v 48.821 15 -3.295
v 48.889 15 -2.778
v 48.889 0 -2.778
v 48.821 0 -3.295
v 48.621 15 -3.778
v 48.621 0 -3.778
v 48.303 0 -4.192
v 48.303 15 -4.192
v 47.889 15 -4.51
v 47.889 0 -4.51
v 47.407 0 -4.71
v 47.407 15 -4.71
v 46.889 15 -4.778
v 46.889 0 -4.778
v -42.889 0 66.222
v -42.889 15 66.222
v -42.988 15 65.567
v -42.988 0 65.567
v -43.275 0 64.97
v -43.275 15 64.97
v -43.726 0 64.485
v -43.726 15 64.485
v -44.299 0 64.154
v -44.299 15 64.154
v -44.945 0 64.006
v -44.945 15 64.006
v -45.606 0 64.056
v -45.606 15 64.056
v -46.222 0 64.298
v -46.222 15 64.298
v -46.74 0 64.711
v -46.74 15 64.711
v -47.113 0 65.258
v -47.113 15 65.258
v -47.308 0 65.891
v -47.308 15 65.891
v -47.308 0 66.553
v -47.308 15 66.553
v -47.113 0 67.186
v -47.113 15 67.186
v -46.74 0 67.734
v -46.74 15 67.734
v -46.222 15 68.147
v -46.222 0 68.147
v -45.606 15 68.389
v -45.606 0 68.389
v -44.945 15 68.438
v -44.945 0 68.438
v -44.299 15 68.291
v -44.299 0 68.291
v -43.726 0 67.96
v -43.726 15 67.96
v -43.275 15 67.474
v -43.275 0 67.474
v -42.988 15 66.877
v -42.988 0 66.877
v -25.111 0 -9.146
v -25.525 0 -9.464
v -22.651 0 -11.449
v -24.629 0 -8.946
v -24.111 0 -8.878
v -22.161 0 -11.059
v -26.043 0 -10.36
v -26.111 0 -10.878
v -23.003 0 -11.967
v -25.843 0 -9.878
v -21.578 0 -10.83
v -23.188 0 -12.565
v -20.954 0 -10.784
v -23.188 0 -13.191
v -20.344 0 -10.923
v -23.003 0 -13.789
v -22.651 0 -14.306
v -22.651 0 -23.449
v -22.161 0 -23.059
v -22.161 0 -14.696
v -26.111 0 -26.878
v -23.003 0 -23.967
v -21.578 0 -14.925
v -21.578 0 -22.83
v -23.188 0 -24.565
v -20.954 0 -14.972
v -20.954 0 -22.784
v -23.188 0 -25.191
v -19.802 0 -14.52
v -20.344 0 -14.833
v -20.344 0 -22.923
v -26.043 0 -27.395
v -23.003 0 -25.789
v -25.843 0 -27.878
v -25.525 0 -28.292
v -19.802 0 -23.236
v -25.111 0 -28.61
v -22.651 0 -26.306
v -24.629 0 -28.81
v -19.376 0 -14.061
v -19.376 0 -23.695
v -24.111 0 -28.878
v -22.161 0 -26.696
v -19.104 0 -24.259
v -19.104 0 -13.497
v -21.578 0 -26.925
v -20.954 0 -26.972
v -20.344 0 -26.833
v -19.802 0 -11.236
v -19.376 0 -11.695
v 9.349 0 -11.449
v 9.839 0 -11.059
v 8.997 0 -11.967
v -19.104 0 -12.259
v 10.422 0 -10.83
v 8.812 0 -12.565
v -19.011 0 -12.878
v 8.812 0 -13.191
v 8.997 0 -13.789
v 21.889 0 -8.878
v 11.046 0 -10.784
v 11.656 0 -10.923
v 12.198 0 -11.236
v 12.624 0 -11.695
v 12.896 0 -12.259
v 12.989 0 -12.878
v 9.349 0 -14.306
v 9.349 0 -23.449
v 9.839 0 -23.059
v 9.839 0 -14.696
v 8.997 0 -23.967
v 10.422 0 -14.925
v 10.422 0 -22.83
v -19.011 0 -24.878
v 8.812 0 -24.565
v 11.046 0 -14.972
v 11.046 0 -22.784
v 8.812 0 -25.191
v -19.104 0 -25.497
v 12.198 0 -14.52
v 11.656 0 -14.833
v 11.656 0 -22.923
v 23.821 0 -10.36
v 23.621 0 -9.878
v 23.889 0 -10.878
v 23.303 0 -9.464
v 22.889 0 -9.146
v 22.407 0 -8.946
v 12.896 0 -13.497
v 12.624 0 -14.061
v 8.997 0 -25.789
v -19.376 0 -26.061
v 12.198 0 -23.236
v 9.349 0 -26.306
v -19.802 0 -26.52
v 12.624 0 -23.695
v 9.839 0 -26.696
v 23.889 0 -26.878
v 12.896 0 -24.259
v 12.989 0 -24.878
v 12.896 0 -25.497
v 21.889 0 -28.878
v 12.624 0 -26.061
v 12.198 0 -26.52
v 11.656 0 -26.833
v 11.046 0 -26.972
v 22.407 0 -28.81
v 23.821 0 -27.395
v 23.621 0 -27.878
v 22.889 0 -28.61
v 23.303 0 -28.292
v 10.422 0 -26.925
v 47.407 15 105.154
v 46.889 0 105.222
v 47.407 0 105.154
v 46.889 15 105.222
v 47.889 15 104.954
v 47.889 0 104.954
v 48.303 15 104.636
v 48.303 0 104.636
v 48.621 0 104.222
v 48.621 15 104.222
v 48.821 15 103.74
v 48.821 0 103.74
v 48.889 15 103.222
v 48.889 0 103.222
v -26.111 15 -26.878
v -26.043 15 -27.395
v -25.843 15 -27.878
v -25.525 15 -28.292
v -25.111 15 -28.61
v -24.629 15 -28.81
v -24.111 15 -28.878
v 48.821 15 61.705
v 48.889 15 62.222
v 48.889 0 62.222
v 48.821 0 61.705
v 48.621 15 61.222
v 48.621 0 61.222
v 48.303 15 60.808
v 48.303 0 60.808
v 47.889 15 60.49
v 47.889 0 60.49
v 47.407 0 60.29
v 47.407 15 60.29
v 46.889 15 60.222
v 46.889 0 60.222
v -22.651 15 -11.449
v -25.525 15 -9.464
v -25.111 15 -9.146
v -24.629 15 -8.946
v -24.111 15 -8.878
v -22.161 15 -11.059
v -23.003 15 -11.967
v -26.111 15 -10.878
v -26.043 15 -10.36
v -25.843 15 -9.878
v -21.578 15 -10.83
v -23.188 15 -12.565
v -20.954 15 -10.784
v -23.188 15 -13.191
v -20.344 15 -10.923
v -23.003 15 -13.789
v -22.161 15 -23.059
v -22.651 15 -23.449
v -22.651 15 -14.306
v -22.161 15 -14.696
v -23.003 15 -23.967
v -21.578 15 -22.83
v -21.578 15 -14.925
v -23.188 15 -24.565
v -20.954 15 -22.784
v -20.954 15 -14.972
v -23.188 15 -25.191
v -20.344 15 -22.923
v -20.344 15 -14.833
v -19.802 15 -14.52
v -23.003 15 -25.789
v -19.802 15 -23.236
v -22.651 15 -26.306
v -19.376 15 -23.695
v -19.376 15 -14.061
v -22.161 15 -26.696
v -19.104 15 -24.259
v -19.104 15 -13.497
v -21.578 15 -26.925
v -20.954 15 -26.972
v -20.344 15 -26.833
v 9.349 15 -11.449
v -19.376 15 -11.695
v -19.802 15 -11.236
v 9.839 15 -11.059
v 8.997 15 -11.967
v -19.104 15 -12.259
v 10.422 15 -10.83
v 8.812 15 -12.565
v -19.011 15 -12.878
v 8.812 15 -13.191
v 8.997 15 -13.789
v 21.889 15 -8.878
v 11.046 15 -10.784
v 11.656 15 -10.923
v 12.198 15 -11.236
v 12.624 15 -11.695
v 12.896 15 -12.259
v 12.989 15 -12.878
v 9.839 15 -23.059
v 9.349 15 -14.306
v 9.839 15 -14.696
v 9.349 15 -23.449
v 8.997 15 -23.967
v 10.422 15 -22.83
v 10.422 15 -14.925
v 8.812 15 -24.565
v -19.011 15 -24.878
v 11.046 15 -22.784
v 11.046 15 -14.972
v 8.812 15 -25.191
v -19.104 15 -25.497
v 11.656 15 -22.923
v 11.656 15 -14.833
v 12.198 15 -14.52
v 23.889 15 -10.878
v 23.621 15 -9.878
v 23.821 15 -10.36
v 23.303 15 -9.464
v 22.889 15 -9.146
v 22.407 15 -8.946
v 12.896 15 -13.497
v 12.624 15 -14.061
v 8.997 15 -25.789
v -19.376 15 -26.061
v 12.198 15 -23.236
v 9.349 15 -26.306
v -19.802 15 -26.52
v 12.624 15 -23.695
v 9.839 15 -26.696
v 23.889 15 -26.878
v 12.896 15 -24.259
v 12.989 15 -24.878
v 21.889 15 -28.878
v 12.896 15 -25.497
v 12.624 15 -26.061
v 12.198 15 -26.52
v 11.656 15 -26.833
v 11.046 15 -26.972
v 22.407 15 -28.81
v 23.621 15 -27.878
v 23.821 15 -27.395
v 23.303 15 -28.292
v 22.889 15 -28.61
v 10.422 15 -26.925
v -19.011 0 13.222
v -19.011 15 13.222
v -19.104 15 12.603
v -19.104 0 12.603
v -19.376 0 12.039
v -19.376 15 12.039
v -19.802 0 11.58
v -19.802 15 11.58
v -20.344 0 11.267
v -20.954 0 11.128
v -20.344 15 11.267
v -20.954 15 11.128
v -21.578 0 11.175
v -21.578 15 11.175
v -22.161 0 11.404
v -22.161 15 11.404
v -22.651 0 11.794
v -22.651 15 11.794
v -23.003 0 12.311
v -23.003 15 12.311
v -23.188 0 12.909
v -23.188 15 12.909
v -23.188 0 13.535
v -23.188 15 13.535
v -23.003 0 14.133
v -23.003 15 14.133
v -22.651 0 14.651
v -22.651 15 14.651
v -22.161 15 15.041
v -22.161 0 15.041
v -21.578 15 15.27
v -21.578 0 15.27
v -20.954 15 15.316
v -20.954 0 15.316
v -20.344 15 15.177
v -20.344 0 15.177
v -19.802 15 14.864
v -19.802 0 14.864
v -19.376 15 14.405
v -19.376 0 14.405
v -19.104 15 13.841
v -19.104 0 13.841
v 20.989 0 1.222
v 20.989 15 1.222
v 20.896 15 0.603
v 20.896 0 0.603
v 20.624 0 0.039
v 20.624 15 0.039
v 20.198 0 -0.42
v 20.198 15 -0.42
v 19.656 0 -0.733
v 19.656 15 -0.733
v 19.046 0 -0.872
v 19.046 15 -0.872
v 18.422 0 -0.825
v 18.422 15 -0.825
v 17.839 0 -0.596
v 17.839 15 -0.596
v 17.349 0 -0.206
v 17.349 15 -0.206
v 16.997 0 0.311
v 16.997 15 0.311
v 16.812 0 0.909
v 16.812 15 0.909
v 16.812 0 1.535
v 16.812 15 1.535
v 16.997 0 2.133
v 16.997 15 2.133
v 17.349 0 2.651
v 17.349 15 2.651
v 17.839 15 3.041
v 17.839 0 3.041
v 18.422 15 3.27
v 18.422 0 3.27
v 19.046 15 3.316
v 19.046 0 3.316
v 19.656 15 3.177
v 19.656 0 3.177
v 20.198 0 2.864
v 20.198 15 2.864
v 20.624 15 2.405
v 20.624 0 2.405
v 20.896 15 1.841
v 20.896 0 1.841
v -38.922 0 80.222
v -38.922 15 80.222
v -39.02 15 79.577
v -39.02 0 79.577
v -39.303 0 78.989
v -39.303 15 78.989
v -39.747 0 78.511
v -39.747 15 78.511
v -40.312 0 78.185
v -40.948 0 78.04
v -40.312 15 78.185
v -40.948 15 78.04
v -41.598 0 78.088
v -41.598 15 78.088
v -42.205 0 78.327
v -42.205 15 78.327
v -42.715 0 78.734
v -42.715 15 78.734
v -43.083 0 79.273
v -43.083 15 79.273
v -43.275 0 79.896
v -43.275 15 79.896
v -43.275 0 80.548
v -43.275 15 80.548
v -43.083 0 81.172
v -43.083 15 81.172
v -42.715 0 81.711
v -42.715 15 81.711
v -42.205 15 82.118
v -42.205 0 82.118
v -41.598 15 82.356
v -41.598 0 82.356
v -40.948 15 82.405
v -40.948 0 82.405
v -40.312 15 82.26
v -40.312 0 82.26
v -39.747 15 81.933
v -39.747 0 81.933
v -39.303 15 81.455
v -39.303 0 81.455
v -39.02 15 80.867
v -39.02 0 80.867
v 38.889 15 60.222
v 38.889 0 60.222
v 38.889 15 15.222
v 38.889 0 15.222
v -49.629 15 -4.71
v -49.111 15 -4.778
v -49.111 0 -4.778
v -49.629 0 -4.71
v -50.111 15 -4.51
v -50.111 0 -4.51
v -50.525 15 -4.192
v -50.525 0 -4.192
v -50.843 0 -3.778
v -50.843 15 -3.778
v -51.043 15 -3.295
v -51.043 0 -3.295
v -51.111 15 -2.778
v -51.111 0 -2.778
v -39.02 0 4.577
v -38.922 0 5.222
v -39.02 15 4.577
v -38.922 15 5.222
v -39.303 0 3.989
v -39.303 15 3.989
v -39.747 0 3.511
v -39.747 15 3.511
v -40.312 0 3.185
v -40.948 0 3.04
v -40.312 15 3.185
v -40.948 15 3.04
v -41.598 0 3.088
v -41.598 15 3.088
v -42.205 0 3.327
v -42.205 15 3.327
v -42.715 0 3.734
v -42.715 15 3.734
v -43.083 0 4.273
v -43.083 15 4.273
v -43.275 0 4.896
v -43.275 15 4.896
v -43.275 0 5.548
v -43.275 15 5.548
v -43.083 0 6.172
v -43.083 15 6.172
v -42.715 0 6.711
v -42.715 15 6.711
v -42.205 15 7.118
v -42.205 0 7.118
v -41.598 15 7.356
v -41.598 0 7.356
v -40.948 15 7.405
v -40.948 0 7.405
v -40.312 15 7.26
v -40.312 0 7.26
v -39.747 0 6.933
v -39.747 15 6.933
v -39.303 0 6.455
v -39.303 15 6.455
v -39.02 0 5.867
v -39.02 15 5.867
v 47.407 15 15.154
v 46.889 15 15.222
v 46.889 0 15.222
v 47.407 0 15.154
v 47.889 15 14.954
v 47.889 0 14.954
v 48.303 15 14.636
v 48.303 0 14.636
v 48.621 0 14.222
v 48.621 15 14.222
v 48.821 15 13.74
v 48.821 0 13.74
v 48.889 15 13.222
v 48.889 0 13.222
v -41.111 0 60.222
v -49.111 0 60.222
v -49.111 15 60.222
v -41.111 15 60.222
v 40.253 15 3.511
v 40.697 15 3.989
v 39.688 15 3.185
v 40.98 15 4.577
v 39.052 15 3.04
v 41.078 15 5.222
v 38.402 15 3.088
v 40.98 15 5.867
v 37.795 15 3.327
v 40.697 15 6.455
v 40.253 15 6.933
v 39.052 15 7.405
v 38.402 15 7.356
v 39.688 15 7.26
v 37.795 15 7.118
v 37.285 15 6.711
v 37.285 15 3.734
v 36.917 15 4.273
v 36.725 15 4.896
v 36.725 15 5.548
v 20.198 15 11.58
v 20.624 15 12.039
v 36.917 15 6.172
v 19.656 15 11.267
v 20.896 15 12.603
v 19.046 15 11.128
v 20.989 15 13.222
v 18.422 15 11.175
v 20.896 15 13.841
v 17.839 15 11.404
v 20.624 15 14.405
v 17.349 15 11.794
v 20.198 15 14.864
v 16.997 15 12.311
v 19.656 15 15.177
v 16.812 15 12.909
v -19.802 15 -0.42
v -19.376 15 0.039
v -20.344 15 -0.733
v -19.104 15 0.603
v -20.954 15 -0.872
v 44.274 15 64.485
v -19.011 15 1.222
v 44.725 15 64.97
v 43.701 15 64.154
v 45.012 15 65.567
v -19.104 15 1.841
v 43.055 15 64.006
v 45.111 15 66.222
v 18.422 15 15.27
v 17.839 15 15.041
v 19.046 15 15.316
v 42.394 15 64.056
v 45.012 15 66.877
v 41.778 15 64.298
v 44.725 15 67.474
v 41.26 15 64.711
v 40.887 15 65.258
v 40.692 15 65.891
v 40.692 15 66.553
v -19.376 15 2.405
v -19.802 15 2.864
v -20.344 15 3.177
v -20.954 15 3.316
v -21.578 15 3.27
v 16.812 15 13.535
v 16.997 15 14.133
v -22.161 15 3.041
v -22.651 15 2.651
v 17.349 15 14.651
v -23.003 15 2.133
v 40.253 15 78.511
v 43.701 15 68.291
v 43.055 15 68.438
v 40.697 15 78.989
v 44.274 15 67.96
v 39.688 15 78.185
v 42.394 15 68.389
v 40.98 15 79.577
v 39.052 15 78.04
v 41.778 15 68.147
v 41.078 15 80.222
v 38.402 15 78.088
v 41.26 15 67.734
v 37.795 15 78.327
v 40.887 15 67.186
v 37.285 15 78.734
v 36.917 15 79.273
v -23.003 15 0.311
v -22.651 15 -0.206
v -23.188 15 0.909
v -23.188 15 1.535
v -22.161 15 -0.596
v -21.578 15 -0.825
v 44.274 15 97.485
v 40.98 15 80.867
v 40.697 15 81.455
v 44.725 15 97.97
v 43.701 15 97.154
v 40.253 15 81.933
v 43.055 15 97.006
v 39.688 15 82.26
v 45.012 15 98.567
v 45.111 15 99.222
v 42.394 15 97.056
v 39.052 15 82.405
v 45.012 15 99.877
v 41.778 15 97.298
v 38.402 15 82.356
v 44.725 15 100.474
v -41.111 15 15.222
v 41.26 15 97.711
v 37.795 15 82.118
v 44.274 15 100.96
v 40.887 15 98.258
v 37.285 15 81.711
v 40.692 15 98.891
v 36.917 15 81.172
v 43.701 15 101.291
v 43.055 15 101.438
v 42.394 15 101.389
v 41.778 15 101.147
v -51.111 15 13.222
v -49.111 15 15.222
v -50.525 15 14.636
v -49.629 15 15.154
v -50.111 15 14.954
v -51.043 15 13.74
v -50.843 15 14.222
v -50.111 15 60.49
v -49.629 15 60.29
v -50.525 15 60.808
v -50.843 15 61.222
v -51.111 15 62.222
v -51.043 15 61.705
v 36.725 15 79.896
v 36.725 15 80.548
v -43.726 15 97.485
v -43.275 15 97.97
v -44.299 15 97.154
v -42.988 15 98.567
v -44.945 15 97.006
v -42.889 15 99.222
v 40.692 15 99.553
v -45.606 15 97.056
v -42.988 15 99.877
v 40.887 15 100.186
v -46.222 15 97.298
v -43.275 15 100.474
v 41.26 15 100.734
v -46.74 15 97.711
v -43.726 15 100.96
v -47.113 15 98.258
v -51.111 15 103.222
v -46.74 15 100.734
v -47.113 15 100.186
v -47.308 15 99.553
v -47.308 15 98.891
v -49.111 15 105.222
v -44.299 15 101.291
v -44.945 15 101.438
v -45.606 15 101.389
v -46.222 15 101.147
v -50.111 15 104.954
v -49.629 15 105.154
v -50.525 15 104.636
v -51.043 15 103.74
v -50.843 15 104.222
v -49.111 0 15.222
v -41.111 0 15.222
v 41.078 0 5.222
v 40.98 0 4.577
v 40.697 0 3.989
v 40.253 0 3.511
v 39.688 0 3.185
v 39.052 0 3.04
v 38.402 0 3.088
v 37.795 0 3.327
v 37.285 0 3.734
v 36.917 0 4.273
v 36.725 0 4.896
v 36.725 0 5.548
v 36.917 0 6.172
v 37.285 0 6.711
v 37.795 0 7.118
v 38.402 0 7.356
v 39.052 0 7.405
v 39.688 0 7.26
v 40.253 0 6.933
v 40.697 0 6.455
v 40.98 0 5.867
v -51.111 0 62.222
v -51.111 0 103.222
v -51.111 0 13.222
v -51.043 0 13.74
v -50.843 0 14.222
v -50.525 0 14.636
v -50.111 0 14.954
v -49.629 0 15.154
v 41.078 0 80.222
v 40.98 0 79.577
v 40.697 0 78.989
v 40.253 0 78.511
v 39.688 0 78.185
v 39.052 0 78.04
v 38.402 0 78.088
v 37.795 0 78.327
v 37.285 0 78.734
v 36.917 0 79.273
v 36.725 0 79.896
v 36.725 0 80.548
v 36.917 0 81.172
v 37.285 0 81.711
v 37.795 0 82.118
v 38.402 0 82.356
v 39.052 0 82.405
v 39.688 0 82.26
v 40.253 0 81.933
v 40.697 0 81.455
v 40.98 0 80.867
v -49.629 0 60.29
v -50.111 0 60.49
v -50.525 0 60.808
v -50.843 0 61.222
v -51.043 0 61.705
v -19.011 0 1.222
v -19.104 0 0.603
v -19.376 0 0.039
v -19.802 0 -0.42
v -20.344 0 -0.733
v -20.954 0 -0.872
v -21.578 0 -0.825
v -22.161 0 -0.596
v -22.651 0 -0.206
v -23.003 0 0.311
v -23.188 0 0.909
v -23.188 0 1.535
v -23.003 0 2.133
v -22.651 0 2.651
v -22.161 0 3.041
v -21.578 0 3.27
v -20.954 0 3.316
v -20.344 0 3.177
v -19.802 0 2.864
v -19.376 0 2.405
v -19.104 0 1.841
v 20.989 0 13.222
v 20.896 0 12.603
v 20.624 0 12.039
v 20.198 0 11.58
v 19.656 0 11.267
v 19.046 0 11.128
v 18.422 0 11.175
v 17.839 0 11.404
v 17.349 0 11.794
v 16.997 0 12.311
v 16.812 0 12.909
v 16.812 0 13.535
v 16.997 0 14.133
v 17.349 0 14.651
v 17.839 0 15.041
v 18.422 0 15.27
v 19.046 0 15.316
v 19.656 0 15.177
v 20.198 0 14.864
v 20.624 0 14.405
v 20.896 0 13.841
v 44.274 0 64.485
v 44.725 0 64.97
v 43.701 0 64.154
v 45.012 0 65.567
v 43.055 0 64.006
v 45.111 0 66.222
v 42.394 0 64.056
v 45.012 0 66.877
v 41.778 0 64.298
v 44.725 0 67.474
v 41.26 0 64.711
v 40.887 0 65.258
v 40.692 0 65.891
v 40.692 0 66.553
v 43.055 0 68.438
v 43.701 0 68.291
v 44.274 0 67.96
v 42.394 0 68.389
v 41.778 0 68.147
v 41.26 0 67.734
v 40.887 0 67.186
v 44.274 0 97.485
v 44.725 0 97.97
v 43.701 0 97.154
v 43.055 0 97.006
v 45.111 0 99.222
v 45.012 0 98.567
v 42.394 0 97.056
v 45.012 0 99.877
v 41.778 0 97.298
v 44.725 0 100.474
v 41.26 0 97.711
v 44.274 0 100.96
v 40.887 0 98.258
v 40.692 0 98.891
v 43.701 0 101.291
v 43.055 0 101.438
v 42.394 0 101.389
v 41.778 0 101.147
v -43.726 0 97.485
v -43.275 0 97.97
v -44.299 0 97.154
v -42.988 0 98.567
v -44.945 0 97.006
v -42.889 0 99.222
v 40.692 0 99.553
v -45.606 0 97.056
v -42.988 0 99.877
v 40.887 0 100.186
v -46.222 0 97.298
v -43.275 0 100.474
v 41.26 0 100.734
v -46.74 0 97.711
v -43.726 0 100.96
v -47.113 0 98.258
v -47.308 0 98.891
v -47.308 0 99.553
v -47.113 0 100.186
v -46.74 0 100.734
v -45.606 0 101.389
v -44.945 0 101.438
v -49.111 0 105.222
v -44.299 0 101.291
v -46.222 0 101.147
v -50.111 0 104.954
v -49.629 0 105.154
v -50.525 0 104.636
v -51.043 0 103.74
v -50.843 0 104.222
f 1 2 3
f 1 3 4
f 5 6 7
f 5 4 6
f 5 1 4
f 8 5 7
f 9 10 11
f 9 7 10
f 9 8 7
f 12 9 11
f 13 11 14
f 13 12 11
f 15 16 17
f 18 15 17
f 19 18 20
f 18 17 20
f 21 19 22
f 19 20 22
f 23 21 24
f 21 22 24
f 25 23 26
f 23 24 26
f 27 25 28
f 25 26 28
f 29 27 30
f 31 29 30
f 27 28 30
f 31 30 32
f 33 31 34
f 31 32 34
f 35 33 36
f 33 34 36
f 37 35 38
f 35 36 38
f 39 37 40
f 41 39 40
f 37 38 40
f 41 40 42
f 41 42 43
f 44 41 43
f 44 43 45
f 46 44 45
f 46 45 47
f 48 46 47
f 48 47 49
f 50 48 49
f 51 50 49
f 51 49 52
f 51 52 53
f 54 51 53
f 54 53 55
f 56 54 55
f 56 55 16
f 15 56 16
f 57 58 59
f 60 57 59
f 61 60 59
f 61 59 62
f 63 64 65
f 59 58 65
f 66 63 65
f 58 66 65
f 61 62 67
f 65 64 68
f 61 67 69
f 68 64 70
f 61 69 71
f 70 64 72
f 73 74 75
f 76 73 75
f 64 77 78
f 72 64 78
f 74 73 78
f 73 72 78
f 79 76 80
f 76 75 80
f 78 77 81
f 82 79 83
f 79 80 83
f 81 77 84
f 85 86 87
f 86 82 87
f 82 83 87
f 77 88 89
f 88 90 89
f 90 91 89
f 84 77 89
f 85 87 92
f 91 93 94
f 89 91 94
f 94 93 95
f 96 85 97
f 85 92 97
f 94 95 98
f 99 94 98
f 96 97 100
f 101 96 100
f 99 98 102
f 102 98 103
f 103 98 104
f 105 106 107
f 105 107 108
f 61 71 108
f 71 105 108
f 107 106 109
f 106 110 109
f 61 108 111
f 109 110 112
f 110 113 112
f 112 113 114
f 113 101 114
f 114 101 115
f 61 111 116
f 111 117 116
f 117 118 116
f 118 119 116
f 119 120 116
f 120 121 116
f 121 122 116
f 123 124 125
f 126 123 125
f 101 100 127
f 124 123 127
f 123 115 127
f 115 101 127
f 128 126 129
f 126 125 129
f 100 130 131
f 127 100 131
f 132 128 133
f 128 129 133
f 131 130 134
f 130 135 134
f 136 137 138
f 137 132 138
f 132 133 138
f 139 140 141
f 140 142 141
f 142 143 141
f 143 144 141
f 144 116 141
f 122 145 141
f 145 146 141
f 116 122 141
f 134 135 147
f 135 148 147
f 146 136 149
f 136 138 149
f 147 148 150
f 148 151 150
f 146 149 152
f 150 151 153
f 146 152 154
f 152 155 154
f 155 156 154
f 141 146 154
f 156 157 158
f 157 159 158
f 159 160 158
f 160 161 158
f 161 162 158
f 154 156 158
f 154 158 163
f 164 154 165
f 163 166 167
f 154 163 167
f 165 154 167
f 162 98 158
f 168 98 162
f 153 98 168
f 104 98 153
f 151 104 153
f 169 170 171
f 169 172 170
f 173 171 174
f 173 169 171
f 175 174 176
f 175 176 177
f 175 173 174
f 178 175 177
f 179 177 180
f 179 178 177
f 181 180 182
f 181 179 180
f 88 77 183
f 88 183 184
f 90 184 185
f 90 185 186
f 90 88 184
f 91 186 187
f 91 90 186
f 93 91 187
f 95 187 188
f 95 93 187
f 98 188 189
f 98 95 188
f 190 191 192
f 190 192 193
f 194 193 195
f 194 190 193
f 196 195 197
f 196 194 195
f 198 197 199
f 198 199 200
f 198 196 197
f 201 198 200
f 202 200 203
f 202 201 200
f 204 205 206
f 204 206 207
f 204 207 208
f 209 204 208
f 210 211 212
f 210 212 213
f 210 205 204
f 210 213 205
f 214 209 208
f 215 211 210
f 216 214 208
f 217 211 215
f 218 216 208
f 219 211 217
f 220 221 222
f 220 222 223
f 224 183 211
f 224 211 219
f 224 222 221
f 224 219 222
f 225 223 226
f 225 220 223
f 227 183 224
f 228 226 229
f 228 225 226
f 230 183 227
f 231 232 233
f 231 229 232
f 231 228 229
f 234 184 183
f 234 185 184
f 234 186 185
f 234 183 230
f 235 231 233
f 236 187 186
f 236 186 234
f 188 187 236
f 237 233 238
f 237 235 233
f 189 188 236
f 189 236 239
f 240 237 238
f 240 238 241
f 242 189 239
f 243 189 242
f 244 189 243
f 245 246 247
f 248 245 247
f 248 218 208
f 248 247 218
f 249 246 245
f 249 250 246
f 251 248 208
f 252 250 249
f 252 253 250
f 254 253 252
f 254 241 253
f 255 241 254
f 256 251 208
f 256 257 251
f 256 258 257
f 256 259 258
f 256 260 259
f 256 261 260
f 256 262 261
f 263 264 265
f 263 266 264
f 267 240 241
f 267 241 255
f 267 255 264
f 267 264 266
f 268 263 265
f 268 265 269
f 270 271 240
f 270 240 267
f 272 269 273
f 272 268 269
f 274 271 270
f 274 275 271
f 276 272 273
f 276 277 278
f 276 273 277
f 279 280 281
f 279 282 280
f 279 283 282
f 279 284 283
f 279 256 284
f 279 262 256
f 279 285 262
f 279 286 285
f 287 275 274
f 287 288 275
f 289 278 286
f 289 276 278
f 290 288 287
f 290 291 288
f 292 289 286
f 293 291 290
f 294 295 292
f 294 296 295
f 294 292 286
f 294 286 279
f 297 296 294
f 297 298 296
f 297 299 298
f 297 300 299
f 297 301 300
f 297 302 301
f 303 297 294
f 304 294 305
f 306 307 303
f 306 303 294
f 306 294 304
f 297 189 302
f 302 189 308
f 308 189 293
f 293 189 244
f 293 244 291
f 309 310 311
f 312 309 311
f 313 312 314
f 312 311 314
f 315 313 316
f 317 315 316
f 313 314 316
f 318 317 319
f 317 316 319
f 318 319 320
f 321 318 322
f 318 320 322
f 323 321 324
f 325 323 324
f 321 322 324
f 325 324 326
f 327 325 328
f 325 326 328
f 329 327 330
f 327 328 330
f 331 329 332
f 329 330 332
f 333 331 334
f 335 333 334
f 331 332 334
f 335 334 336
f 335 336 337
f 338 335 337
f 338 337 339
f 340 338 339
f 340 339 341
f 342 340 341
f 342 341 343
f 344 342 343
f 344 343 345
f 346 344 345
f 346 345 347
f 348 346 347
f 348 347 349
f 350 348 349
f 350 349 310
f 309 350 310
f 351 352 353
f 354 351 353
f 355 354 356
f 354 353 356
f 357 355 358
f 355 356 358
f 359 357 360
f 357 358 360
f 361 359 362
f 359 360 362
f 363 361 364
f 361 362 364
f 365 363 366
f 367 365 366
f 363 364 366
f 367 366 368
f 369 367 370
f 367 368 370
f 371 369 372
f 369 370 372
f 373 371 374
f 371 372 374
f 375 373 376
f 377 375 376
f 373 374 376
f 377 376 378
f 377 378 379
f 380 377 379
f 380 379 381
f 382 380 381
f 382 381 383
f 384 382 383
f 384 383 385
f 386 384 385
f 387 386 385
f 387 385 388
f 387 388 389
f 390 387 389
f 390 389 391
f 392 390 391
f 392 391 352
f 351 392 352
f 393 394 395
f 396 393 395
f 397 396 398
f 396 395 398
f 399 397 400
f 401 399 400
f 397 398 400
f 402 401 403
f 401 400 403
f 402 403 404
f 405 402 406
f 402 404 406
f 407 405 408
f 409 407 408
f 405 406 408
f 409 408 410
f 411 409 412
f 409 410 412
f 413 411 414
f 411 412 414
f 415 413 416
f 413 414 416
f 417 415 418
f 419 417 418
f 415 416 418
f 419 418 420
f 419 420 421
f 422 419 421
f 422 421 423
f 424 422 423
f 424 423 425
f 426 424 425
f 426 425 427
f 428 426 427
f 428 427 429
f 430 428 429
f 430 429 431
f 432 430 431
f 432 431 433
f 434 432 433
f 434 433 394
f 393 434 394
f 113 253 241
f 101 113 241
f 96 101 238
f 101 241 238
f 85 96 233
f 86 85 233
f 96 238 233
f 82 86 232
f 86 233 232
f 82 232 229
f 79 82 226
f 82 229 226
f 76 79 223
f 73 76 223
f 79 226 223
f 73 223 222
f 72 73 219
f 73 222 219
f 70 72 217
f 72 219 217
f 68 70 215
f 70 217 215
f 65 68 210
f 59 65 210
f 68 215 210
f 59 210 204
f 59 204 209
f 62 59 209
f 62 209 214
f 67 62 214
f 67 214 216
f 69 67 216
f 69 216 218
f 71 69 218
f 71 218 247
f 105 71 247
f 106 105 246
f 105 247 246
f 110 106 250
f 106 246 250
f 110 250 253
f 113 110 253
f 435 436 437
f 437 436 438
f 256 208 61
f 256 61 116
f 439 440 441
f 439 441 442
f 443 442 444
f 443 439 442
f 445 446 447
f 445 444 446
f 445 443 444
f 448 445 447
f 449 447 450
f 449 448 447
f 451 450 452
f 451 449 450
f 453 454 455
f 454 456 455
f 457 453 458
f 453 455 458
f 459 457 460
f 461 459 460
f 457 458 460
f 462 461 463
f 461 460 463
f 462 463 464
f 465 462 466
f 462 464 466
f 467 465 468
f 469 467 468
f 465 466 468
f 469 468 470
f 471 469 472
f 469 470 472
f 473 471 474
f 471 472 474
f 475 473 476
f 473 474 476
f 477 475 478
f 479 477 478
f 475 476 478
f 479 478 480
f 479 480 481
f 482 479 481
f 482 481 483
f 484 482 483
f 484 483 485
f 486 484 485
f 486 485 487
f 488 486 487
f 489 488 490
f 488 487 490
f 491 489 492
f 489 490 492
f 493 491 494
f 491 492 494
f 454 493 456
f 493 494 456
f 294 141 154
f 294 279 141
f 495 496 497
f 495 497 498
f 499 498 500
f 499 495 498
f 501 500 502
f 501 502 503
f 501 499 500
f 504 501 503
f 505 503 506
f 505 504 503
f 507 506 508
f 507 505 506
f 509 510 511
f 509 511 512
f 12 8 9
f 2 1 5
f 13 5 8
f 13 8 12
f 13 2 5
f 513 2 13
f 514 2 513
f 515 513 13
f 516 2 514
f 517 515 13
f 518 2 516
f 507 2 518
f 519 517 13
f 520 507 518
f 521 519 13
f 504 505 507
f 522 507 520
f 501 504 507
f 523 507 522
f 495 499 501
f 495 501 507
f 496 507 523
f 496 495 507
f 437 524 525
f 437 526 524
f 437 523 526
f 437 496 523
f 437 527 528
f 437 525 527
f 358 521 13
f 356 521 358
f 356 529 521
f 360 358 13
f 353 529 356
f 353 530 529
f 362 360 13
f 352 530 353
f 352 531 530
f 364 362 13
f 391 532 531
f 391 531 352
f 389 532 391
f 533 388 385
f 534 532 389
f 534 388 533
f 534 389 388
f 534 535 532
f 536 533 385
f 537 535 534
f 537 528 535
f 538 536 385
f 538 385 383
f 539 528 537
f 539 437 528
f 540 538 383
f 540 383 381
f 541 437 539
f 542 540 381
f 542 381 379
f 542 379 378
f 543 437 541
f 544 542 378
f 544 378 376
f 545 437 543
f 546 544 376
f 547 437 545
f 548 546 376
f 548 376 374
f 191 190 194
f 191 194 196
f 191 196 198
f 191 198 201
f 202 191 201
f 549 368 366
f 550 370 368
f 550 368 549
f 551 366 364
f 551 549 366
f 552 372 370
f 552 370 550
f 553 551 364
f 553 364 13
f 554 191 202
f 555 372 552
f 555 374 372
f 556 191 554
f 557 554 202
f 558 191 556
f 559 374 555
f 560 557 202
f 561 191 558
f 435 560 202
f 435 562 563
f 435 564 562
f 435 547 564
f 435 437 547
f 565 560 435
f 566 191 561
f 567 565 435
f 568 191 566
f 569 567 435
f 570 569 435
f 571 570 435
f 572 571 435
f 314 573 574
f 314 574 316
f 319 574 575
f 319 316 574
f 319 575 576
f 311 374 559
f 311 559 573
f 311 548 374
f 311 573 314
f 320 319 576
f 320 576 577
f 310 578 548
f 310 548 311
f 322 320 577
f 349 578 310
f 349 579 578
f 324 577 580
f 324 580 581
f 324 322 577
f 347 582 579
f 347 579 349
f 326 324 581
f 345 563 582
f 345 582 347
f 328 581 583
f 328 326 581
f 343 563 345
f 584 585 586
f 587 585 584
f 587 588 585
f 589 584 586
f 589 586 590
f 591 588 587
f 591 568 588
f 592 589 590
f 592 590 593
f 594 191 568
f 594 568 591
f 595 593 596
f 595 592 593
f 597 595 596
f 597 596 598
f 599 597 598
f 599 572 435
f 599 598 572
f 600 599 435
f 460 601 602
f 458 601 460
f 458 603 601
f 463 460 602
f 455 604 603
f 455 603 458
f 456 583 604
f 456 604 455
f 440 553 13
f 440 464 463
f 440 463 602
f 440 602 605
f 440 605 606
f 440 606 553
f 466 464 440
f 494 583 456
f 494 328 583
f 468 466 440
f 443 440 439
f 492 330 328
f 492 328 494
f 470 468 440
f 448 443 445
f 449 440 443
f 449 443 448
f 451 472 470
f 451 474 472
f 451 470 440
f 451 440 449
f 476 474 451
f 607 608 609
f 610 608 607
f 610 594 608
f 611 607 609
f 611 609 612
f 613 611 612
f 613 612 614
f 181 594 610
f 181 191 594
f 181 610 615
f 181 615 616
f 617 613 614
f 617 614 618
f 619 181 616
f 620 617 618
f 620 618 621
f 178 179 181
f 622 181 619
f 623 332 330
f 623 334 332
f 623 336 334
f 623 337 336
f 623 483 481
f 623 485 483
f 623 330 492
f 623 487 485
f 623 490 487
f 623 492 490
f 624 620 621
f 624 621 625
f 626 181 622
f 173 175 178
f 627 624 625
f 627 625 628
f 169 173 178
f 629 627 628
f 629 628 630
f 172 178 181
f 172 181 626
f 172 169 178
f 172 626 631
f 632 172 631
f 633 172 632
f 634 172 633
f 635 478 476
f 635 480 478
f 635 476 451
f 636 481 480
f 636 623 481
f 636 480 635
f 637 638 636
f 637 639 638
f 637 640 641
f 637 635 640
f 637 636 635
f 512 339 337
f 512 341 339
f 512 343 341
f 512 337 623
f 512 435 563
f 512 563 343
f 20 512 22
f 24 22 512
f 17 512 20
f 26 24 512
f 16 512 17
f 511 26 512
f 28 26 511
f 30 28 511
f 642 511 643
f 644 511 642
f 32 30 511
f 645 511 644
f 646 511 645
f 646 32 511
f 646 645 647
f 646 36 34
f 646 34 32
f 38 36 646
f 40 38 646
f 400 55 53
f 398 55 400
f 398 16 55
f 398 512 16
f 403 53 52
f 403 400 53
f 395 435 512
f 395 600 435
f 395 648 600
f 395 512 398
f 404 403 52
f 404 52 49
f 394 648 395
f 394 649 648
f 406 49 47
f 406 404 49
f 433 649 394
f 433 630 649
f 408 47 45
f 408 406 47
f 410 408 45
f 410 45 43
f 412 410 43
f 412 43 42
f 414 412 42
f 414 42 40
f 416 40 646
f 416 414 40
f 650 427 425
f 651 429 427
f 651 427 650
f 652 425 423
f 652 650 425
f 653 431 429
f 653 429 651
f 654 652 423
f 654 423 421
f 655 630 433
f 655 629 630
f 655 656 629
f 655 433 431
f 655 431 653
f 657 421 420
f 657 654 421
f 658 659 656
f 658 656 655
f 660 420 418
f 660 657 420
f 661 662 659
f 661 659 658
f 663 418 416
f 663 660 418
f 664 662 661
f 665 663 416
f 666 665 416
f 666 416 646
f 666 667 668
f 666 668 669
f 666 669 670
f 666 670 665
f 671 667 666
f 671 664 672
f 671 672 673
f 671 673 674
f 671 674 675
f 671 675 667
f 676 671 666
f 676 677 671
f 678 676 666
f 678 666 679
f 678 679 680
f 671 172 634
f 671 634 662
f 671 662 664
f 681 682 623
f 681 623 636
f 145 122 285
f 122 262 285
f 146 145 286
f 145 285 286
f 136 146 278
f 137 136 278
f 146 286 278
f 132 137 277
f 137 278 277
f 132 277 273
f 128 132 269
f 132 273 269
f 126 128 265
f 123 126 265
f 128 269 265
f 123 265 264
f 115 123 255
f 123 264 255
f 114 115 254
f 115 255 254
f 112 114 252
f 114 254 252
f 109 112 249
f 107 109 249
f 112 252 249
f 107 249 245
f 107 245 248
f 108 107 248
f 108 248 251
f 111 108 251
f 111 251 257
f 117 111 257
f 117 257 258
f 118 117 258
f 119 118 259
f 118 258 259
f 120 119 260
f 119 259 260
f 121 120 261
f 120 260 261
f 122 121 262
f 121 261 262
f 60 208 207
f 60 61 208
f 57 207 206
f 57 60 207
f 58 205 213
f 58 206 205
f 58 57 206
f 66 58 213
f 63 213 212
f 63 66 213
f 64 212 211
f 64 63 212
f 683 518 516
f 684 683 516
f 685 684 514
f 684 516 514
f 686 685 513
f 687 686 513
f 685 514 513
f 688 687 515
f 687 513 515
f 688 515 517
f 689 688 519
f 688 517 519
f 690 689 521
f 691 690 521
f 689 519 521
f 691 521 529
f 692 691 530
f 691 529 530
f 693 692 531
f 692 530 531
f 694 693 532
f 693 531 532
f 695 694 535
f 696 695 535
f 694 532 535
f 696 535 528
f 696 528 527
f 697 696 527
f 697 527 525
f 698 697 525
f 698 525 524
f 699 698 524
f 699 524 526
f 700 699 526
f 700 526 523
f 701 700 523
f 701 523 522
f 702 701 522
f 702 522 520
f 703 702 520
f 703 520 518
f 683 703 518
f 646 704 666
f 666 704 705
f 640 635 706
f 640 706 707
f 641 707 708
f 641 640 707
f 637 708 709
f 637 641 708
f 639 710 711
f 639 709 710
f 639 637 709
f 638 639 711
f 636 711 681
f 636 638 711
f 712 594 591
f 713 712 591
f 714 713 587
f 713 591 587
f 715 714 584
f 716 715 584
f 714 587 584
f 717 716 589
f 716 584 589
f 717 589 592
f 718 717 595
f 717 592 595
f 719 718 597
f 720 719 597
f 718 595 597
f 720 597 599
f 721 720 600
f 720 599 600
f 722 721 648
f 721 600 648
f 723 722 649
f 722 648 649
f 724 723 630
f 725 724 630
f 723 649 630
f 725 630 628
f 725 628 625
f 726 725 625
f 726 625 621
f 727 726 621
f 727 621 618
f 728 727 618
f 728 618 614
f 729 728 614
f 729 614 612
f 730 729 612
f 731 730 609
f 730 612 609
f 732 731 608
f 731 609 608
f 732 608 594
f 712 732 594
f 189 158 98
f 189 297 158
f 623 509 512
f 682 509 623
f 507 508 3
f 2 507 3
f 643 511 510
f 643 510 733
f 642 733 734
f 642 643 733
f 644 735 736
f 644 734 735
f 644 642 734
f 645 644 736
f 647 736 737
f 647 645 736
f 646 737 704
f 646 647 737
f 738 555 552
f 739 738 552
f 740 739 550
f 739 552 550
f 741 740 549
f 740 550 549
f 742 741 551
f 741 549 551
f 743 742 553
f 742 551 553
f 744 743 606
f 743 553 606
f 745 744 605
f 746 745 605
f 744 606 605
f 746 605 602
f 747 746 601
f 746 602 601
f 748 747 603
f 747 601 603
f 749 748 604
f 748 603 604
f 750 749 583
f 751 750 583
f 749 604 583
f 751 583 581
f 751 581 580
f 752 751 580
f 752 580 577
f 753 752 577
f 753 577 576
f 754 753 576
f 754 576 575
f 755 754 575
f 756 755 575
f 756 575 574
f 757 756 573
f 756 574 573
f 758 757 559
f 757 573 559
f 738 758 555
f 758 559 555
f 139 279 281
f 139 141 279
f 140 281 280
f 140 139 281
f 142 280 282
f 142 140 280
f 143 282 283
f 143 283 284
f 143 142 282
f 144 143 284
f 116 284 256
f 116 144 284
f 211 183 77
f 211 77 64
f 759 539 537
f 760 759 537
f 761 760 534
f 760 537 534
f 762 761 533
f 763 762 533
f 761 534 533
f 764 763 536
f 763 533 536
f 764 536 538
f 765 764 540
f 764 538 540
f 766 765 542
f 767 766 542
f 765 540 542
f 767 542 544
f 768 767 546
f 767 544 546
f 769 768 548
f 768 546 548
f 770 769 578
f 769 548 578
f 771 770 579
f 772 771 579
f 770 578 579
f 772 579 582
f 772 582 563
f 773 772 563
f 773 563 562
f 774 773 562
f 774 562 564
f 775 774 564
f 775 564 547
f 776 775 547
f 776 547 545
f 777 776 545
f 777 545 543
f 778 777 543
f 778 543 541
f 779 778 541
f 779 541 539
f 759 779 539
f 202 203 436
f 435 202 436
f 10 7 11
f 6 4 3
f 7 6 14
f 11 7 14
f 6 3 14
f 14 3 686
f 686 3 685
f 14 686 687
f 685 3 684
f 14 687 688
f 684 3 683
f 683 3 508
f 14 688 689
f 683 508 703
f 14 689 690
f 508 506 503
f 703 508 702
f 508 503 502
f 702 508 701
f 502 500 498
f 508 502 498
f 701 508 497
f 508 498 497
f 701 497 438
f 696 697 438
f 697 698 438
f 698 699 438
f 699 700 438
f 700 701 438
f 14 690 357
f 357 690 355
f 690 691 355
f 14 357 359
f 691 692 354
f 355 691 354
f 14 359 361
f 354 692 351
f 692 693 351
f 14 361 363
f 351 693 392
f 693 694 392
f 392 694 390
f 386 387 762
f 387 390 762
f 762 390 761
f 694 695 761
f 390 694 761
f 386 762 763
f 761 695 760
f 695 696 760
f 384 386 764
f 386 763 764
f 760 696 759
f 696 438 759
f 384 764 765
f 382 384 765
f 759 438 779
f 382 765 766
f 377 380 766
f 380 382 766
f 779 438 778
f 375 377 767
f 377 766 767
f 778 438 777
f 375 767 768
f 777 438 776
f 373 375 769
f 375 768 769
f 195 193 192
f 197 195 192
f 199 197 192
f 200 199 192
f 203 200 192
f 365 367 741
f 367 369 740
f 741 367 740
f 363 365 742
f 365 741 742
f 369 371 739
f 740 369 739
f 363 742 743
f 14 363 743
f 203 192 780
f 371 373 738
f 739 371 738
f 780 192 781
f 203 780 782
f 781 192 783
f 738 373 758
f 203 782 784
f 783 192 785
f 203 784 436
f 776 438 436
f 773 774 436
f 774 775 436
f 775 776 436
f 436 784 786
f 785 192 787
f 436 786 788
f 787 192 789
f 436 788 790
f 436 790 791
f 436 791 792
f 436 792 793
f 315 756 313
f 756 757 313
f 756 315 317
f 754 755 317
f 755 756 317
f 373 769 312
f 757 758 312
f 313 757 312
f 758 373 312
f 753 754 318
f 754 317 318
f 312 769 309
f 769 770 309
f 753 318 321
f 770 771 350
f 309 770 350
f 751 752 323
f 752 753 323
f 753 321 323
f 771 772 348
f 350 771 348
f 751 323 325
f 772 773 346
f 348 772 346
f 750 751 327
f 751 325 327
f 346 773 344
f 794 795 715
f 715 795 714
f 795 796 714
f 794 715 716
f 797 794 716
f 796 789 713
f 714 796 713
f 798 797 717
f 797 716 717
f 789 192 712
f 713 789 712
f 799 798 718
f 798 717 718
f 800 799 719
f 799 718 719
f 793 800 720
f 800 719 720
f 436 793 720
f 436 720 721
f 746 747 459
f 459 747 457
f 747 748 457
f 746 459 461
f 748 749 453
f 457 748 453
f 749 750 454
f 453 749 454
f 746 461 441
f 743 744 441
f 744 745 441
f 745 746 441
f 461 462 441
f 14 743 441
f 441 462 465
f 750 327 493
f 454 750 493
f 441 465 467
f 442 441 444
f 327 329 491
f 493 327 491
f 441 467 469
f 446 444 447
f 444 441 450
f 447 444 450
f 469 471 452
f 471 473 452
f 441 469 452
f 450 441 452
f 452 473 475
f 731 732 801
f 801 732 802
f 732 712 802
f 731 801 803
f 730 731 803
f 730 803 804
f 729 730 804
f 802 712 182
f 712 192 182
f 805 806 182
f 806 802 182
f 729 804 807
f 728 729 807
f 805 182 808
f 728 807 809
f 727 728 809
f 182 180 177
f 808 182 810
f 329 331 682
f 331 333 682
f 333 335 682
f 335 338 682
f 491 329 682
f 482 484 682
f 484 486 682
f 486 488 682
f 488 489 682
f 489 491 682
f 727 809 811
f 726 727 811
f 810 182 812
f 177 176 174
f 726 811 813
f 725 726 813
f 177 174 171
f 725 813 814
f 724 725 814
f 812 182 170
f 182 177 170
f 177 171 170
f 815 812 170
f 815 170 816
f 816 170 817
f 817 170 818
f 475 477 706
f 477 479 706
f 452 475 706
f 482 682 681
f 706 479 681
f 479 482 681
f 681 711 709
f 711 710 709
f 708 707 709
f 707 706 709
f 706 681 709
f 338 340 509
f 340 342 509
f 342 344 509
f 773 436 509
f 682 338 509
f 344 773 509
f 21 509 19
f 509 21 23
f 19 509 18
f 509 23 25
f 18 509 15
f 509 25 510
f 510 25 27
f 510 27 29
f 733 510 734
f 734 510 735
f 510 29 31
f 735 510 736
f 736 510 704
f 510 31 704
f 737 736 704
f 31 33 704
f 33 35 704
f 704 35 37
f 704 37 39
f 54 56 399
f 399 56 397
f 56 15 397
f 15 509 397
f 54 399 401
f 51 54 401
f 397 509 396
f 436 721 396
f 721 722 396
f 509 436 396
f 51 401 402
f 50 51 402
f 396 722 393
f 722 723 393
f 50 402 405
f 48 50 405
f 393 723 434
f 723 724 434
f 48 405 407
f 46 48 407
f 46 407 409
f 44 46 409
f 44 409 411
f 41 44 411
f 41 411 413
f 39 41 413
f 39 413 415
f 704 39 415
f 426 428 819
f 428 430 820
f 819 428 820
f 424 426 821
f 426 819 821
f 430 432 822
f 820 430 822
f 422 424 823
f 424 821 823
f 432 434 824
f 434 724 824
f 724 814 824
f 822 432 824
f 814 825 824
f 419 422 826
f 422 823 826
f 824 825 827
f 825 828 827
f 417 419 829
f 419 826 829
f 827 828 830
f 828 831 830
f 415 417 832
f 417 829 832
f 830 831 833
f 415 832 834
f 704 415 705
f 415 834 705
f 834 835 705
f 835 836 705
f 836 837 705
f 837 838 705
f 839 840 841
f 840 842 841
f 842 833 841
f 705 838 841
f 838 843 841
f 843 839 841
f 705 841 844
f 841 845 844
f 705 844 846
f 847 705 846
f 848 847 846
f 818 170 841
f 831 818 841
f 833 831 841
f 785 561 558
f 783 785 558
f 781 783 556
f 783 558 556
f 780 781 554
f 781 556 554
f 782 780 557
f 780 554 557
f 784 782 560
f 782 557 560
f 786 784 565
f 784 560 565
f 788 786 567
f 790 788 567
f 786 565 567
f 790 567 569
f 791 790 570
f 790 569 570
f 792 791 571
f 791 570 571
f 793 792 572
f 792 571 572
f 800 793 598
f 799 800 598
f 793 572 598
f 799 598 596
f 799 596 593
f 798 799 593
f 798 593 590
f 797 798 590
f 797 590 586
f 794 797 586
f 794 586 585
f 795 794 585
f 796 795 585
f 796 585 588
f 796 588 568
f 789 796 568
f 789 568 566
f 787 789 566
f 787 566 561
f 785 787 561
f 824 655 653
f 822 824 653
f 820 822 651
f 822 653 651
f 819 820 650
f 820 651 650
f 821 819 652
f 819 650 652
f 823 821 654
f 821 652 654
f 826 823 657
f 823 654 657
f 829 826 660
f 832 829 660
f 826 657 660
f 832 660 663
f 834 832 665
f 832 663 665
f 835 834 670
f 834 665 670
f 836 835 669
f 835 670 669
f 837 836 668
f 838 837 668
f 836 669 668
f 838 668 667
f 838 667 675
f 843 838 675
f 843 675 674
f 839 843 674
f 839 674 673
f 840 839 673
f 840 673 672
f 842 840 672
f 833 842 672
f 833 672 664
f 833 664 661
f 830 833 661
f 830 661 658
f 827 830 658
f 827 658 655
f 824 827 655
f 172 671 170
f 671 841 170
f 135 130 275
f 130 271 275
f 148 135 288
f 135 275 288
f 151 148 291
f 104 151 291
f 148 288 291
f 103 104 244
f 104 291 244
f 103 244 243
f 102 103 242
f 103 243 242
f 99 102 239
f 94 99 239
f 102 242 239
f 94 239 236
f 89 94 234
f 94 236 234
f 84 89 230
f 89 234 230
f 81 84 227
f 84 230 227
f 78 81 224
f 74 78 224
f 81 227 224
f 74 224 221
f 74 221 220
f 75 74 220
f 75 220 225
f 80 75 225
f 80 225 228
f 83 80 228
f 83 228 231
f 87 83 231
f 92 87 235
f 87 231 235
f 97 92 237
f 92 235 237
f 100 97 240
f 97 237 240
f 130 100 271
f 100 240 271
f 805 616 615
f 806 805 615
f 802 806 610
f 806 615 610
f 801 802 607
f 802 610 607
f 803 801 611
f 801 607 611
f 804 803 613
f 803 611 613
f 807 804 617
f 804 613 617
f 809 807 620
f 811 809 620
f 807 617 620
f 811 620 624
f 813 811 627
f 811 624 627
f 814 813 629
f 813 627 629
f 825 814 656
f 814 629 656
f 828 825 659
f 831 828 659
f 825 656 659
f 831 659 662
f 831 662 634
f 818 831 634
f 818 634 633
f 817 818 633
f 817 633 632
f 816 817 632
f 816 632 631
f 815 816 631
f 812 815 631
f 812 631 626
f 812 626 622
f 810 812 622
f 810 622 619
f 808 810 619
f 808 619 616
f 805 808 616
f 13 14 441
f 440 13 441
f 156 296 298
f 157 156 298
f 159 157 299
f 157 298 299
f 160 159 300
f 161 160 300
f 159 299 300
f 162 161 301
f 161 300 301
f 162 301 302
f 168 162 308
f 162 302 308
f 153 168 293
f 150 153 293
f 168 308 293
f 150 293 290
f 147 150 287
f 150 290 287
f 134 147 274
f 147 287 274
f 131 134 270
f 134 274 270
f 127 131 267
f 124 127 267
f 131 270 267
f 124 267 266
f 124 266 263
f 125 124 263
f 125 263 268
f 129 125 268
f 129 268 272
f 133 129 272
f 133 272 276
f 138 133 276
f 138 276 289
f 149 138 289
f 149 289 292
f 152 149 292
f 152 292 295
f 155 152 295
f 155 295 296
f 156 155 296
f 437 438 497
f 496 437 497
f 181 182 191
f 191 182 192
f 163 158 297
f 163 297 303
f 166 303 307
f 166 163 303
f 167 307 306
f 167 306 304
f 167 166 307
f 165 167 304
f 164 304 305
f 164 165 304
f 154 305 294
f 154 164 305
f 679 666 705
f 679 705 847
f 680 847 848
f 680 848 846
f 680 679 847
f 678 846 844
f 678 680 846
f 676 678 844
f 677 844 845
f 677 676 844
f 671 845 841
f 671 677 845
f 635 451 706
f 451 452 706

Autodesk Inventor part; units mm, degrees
ref_plane "YZ Plane" through (0, 0, 0) normal (1, 0, 0) x (0, 1, 0)
ref_plane "XZ Plane" through (0, 0, 0) normal (0, 1, 0) x (-1, 0, 0)
ref_plane "XY Plane" through (0, 0, 0) normal (0, 0, 1) x (1, 0, 0)
sketch "Sketch1" plane through (0, 0, 0) normal (0, 1, 0) x (-1, 0, 0)
  line L0 (51.1111, 105.2222) -> (-48.8889, 105.2222)
  line L1 (-48.8889, 105.2222) -> (-48.8889, -4.7778)
  line L2 (-48.8889, -4.7778) -> (51.1111, -4.7778)
  line L3 (51.1111, -4.7778) -> (51.1111, 105.2222)
  line L4 (52.6672, 60.2222) -> (41.1111, 60.2222)
  line L5 (41.1111, 60.2222) -> (41.1111, 15.2222)
  line L6 (41.1111, 15.2222) -> (52.6672, 15.2222)
  line L7 (52.6672, 15.2222) -> (52.6672, 60.2222)
  line L8 (-66.472, 60.2222) -> (-38.8889, 60.2222)
  line L9 (-38.8889, 60.2222) -> (-38.8889, 15.2222)
  line L10 (-38.8889, 15.2222) -> (-66.472, 15.2222)
  line L11 (-66.472, 15.2222) -> (-66.472, 60.2222)
  point P0 (0, 0)
  point P1 (-48.8889, 60.2222)
  point P2 (-48.8889, 15.2222)
  point P3 (51.1111, 15.2222)
  point P4 (51.1111, 60.2222)
  dimension "d0" = 100
  dimension "d1" = 110
  dimension "d6" = 20
  dimension "d7" = 20
  dimension "d8" = 10
  dimension "d9" = 10
  dimension "d10" = 45
  dimension "d11" = 45
extrude "Extrusion1" add sketch "Sketch1" along normal blind 15 contours L3 L4 L5 L6 L2 L1 L10 L9 L8 L0
sketch "Sketch2" plane through (0, 15, 0) normal (0, 1, 0) x (1, 0, 0)
  point P0 (0, 0)
sketch "Sketch3" plane through (0, 15, 0) normal (0, 1, 0) x (1, 0, 0)
  point P0 (0, 0)
sketch "Sketch4" plane through (0, 15, 0) normal (0, 1, 0) x (1, 0, 0)
  line L0 (48.8889, -105.2222) -> (48.8889, -60.2222) projected
  line L1 (48.8889, -60.2222) -> (38.8889, -60.2222) projected
  line L2 (38.8889, -60.2222) -> (38.8889, -15.2222) projected
  line L3 (38.8889, -15.2222) -> (48.8889, -15.2222) projected
  line L4 (48.8889, -15.2222) -> (48.8889, 4.7778) projected
  line L5 (48.8889, 4.7778) -> (-51.1111, 4.7778) projected
  line L6 (-51.1111, 4.7778) -> (-51.1111, -15.2222) projected
  line L7 (-51.1111, -15.2222) -> (-41.1111, -15.2222) projected
  line L8 (-41.1111, -15.2222) -> (-41.1111, -60.2222) projected
  line L9 (-41.1111, -60.2222) -> (-51.1111, -60.2222) projected
  line L10 (-51.1111, -60.2222) -> (-51.1111, -105.2222) projected
  line L11 (-51.1111, -105.2222) -> (48.8889, -105.2222) projected
  circle A0 centre (-41.1111, -5.2222) radius 10
  circle A1 centre (38.8889, -5.2222) radius 10
  circle A2 centre (-41.1111, -80.2222) radius 10
  circle A3 centre (38.8889, -80.2222) radius 10
  circle A4 centre (-41.1111, -80.2222) radius 2.1886
  circle A5 centre (38.8889, -80.2222) radius 2.1886
  circle A6 centre (-41.1111, -5.2222) radius 2.1886
  circle A7 centre (38.8889, -5.2222) radius 2.1886
  circle A8 centre (-21.1111, -13.2222) radius 2.1
  circle A9 centre (18.8889, -13.2222) radius 2.1
  line L12 (-45.1111, -99.2222) -> (-45.1111, -66.2222)
  line L13 (-45.1111, -66.2222) -> (-35.1111, -66.2222)
  line L14 (-35.1111, -66.2222) -> (-35.1111, -9.2222)
  line L15 (-35.1111, -9.2222) -> (-45.1111, -9.2222)
  line L16 (-45.1111, -9.2222) -> (-45.1111, -1.2222)
  line L17 (-45.1111, -1.2222) -> (42.8889, -1.2222)
  line L18 (42.8889, -1.2222) -> (42.8889, -9.2222)
  line L19 (42.8889, -9.2222) -> (32.8889, -9.2222)
  line L20 (32.8889, -9.2222) -> (32.8889, -66.2222)
  line L21 (32.8889, -66.2222) -> (42.8889, -66.2222)
  line L22 (42.8889, -66.2222) -> (42.8889, -99.2222)
  line L23 (42.8889, -99.2222) -> (-45.1111, -99.2222)
  circle A10 centre (-45.1111, -66.2222) radius 2.2222
  circle A11 centre (42.8889, -66.2222) radius 2.2222
  circle A12 centre (42.8889, -99.2222) radius 2.2222
  circle A13 centre (-45.1111, -99.2222) radius 2.2222
  circle A14 centre (-21.1111, -1.2222) radius 2.1
  circle A15 centre (18.8889, -1.2222) radius 2.1
  point P0 (0, 0)
  dimension "d19" = 20
  dimension "d20" = 20
  dimension "d21" = 10
  dimension "d22" = 10
  dimension "d23" = 18
  dimension "d24" = 18
  dimension "d25" = 20
  dimension "d26" = 20
  dimension "d27" = 4.2
  dimension "d28" = 4.2
  dimension "d29" = 6
  dimension "d38" = 12
  dimension "d39" = 12
extrude "Extrusion2" cut sketch "Sketch4" against normal blind 15 contours A11 L21 L22 | L22 L21 A11 | A12 L23 L22 | L22 L23 A12 | A10 L13 L12 | L12 L13 A10 | A13 L23 L12 | L12 L23 A13 | A15 L17 | L17 A15 | A14 L17 | L17 A14 | A4 | A5 | A6 | A7 | A8 | A9
sketch "Sketch6" plane through (0, 15, 0) normal (0, 1, 0) x (1, 0, 0)
  line L0 (-26.1111, 8.8778) -> (23.8889, 8.8778)
  line L1 (23.8889, 8.8778) -> (23.8889, 28.8778)
  line L2 (23.8889, 28.8778) -> (-26.1111, 28.8778)
  line L3 (-26.1111, 28.8778) -> (-26.1111, 8.8778)
  line L4 (-51.1111, 4.7778) -> (-51.1111, -15.2222) projected
  line L5 (48.8889, -15.2222) -> (48.8889, 4.7778) projected
  line L6 (48.8889, 4.7778) -> (-51.1111, 4.7778) projected
  circle A0 centre (-21.1111, 24.8778) radius 2.1
  circle A1 centre (10.8889, 24.8778) radius 2.1
  circle A2 centre (-21.1111, 12.8778) radius 2.1
  circle A3 centre (10.8889, 12.8778) radius 2.1
  point P0 (0, 0)
  point P1 (-51.1111, -5.2222)
  dimension "d30" = 25
  dimension "d31" = 25
  dimension "d32" = 4.1
  dimension "d33" = 20
  dimension "d34" = 4
  dimension "d35" = 4
  dimension "d36" = 4
  dimension "d37" = 4
extrude "Extrusion4" add sketch "Sketch6" against normal blind 15
fillet "Fillet1" radius 2 12 edges at (48.8889, 7.5, 60.2222) (48.8889, 7.5, 15.2222) (23.8889, 7.5, -8.8778) (23.8889, 7.5, -28.8778) (-26.1111, 7.5, -28.8778) (-26.1111, 7.5, -8.8778) (-51.1111, 7.5, -4.7778) (-51.1111, 7.5, 15.2222) (-51.1111, 7.5, 60.2222) (-51.1111, 7.5, 105.2222) (48.8889, 7.5, 105.2222) (48.8889, 7.5, -4.7778)
properties part number "DerzavkaDviz"
